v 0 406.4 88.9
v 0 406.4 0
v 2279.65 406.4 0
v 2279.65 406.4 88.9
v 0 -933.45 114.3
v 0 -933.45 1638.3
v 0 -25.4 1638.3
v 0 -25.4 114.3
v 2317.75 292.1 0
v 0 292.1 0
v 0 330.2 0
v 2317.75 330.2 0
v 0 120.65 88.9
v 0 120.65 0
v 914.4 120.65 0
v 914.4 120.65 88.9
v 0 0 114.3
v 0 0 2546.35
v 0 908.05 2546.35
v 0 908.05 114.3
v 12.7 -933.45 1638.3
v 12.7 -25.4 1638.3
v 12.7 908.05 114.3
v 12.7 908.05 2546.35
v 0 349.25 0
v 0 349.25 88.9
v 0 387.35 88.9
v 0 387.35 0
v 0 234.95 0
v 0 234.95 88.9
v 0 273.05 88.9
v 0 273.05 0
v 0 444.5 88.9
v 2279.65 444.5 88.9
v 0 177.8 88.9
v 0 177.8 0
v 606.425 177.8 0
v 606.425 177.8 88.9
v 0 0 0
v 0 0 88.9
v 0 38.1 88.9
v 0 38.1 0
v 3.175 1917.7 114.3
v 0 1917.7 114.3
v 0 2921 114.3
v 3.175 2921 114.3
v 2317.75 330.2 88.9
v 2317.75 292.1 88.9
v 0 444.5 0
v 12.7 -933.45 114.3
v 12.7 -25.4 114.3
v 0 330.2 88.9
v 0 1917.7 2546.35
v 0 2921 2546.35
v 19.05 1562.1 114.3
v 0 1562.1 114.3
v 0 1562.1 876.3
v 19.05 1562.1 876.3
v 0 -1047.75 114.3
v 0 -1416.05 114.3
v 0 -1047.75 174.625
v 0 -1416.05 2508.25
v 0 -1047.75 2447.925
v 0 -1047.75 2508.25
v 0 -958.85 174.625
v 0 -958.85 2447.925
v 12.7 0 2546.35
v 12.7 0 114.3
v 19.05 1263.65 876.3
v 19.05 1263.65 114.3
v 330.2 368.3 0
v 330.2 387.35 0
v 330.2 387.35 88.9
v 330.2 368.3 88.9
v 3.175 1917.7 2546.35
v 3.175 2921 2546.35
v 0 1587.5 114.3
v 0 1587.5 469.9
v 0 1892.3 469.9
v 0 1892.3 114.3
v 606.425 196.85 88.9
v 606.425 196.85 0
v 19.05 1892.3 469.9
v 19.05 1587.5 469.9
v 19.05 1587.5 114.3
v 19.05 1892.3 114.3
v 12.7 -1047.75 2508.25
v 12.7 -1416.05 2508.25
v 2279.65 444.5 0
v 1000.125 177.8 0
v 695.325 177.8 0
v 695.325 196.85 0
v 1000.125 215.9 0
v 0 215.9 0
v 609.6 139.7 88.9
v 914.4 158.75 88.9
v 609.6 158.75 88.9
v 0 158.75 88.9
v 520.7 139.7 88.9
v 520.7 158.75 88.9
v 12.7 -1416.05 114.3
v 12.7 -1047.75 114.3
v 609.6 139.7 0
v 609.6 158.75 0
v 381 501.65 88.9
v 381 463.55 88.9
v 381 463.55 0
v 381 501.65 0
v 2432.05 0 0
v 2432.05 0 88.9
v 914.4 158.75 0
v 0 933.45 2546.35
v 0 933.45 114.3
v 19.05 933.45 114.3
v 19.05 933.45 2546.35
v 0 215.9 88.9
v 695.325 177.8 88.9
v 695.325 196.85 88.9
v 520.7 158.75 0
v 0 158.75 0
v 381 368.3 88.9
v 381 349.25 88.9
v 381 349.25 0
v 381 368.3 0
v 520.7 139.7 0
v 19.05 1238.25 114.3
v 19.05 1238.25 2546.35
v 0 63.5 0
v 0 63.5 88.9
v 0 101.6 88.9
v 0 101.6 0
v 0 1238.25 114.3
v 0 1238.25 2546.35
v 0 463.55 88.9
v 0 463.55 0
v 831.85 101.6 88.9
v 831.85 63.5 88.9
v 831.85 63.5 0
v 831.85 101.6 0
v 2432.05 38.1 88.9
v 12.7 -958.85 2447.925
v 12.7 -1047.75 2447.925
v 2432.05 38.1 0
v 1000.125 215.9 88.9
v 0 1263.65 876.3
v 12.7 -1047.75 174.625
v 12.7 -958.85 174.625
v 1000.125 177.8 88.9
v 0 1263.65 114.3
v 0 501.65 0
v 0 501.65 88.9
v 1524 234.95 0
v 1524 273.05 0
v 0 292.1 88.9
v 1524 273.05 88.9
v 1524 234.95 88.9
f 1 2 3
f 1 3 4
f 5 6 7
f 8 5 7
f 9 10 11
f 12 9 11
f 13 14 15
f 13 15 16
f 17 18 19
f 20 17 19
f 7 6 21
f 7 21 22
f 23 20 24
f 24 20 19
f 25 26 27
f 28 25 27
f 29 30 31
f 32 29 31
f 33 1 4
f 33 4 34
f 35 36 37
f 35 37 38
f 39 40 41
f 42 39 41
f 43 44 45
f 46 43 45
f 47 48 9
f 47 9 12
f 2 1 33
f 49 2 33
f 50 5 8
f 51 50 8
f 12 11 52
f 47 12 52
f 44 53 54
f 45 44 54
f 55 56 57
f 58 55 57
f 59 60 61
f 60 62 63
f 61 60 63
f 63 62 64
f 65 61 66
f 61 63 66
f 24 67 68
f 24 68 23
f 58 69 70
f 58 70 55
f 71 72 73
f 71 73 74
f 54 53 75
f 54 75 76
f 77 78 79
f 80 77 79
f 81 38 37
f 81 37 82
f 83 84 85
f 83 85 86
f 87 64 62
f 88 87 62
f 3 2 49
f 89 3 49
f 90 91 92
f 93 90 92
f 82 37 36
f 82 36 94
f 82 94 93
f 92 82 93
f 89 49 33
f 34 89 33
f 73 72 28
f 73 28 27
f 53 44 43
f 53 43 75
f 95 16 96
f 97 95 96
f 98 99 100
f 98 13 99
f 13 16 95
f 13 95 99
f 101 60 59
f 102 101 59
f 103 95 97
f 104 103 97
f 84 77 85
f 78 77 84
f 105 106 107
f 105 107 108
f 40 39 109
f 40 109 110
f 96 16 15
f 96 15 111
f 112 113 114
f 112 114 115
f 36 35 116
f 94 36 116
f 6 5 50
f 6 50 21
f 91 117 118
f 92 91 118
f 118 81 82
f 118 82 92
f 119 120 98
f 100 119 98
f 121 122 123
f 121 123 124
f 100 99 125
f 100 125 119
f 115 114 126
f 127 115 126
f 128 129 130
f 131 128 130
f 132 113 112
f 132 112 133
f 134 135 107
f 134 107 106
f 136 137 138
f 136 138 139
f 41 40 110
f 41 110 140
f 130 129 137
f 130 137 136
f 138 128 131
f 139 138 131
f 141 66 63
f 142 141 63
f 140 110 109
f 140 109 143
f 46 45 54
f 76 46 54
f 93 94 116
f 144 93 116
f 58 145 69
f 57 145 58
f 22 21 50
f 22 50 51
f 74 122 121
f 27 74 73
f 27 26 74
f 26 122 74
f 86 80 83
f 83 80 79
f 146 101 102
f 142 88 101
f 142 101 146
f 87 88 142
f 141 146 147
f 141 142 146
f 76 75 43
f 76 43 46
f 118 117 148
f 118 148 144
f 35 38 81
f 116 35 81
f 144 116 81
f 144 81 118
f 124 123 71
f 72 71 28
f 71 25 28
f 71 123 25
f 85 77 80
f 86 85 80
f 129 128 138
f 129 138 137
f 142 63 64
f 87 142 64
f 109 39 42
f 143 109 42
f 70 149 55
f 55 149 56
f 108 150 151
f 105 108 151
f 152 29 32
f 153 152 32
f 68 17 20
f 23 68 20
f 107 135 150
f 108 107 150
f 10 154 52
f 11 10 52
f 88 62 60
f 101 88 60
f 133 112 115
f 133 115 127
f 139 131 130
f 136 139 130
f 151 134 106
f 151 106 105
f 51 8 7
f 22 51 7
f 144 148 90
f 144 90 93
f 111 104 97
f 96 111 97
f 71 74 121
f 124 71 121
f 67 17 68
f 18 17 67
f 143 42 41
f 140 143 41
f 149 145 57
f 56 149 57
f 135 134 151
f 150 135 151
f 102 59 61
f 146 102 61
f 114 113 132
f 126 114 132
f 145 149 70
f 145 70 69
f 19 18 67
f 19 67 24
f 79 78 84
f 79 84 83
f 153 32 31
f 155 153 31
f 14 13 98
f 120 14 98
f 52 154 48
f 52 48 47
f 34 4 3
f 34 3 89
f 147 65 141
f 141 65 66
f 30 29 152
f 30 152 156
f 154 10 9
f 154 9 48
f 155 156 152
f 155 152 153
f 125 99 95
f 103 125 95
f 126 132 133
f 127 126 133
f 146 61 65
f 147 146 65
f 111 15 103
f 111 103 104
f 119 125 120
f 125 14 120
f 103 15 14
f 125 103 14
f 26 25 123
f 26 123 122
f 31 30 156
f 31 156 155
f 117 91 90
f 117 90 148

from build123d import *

# Parameters (mm, degrees)
F0_W      = 38.1
F0_H      = 88.9
F1_DEPTH  = 2432.05
F2_W      = 38.1
F2_H      = 88.9
F3_DEPTH  = 831.85
F4_W      = 38.1
F4_H      = 88.9
F5_DEPTH  = 914.4
F6_DEPTH  = 1000.125
F7_W      = 88.9
F7_H      = 19.05
F8_DEPTH  = 88.9
F9_W      = 88.9
F9_H      = 19.05
F10_DEPTH = 88.9
F4_W_2    = 908.05
F4_H_2    = 2432.05
F4_H_3    = 1524
F11_DEPTH = 12.7
F4_W_3    = 304.8
F4_W_4    = 298.45
F4_H_4    = 762
F4_H_5    = 355.6
F12_DEPTH = 19.05
F13_DEPTH = 1524
F14_DEPTH = 2317.75
F15_DEPTH = 381
F16_DEPTH = 2279.65
F17_W     = 50.8
F17_H     = 19.05
F18_DEPTH = 88.9
F4_W_5    = 1003.3
F19_DEPTH = 3.175


with BuildPart() as f1:
    # F0 (on Right) → F1 (new body)
    with BuildSketch(Plane.YZ):
        with Locations((19.05, 44.45)):
            Rectangle(F0_W, F0_H)
    extrude(amount=F1_DEPTH)


with BuildPart() as f3:
    # F2 (on Right) → F3 (new body)
    with BuildSketch(Plane.YZ):
        with Locations((82.55, 44.45)):
            Rectangle(F2_W, F2_H)
    extrude(amount=F3_DEPTH)


with BuildPart() as f5:
    # F4 (on Right) → F5 (new body)
    with BuildSketch(Plane.YZ):
        with Locations((139.7, 44.45)):
            Rectangle(F4_W, F4_H)
    extrude(amount=F5_DEPTH)

    # F9 (on face) → F10 (cut, through all)
    with BuildSketch(Plane.XY.offset(88.9)):
        with Locations((565.15, 149.225)):
            Rectangle(F9_W, F9_H)
    extrude(amount=-F10_DEPTH, mode=Mode.SUBTRACT)


with BuildPart() as f6:
    # F4 (on Right) → F6 (new body)
    with BuildSketch(Plane.YZ):
        with Locations((196.85, 44.45)):
            Rectangle(F4_W, F4_H)
    extrude(amount=F6_DEPTH)

    # F7 (on face) → F8 (cut, through all)
    with BuildSketch(Plane.XY.offset(88.9)):
        with Locations((650.875, 187.325)):
            Rectangle(F7_W, F7_H)
    extrude(amount=-F8_DEPTH, mode=Mode.SUBTRACT)


with BuildPart() as f11:
    # F4 (on Right) → F11 (new body)
    with BuildSketch(Plane.YZ):
        with Locations((454.025, 1330.325)):
            Rectangle(F4_W_2, F4_H_2)
        with Locations((-479.425, 876.3)):
            Rectangle(F4_W_2, F4_H_3)
        Polygon((-1416.05, 114.3), (-1047.75, 114.3), (-1047.75, 174.625), (-958.85, 174.625), (-958.85, 2447.925), (-1047.75, 2447.925), (-1047.75, 2508.25), (-1416.05, 2508.25), align=None)
    extrude(amount=F11_DEPTH)


with BuildPart() as f12:
    # F4 (on Right) → F12 (new body)
    with BuildSketch(Plane.YZ):
        with Locations((1085.85, 1330.325)):
            Rectangle(F4_W_3, F4_H_2)
        with Locations((1412.875, 495.3)):
            Rectangle(F4_W_4, F4_H_4)
        with Locations((1739.9, 292.1)):
            Rectangle(F4_W_3, F4_H_5)
    extrude(amount=F12_DEPTH)


with BuildPart() as f13:
    # F4 (on Right) → F13 (new body)
    with BuildSketch(Plane.YZ):
        with Locations((254, 44.45)):
            Rectangle(F4_W, F4_H)
    extrude(amount=F13_DEPTH)


with BuildPart() as f14:
    # F4 (on Right) → F14 (new body)
    with BuildSketch(Plane.YZ):
        with Locations((311.15, 44.45)):
            Rectangle(F4_W, F4_H)
    extrude(amount=F14_DEPTH)


with BuildPart() as f15:
    # F4 (on Right) → F15 (new body)
    with BuildSketch(Plane.YZ):
        with Locations((368.3, 44.45)):
            Rectangle(F4_W, F4_H)
        with Locations((482.6, 44.45)):
            Rectangle(F4_W, F4_H)
    extrude(amount=F15_DEPTH)

    # F17 (on face) → F18 (cut, through all)
    with BuildSketch(Plane(origin=(0, 0, 0), x_dir=(1, 0, 0), z_dir=(0, 0, -1))):
        with Locations((355.6, -377.825)):
            Rectangle(F17_W, F17_H)
    extrude(amount=-F18_DEPTH, mode=Mode.SUBTRACT)


with BuildPart() as f16:
    # F4 (on Right) → F16 (new body)
    with BuildSketch(Plane.YZ):
        with Locations((425.45, 44.45)):
            Rectangle(F4_W, F4_H)
    extrude(amount=F16_DEPTH)


with BuildPart() as f19:
    # F4 (on Right) → F19 (new body)
    with BuildSketch(Plane.YZ):
        with Locations((2419.35, 1330.325)):
            Rectangle(F4_W_5, F4_H_2)
    extrude(amount=F19_DEPTH)


solid = Compound([f1.part, f3.part, f5.part, f6.part, f11.part, f12.part, f13.part, f14.part, f15.part, f16.part, f19.part])
